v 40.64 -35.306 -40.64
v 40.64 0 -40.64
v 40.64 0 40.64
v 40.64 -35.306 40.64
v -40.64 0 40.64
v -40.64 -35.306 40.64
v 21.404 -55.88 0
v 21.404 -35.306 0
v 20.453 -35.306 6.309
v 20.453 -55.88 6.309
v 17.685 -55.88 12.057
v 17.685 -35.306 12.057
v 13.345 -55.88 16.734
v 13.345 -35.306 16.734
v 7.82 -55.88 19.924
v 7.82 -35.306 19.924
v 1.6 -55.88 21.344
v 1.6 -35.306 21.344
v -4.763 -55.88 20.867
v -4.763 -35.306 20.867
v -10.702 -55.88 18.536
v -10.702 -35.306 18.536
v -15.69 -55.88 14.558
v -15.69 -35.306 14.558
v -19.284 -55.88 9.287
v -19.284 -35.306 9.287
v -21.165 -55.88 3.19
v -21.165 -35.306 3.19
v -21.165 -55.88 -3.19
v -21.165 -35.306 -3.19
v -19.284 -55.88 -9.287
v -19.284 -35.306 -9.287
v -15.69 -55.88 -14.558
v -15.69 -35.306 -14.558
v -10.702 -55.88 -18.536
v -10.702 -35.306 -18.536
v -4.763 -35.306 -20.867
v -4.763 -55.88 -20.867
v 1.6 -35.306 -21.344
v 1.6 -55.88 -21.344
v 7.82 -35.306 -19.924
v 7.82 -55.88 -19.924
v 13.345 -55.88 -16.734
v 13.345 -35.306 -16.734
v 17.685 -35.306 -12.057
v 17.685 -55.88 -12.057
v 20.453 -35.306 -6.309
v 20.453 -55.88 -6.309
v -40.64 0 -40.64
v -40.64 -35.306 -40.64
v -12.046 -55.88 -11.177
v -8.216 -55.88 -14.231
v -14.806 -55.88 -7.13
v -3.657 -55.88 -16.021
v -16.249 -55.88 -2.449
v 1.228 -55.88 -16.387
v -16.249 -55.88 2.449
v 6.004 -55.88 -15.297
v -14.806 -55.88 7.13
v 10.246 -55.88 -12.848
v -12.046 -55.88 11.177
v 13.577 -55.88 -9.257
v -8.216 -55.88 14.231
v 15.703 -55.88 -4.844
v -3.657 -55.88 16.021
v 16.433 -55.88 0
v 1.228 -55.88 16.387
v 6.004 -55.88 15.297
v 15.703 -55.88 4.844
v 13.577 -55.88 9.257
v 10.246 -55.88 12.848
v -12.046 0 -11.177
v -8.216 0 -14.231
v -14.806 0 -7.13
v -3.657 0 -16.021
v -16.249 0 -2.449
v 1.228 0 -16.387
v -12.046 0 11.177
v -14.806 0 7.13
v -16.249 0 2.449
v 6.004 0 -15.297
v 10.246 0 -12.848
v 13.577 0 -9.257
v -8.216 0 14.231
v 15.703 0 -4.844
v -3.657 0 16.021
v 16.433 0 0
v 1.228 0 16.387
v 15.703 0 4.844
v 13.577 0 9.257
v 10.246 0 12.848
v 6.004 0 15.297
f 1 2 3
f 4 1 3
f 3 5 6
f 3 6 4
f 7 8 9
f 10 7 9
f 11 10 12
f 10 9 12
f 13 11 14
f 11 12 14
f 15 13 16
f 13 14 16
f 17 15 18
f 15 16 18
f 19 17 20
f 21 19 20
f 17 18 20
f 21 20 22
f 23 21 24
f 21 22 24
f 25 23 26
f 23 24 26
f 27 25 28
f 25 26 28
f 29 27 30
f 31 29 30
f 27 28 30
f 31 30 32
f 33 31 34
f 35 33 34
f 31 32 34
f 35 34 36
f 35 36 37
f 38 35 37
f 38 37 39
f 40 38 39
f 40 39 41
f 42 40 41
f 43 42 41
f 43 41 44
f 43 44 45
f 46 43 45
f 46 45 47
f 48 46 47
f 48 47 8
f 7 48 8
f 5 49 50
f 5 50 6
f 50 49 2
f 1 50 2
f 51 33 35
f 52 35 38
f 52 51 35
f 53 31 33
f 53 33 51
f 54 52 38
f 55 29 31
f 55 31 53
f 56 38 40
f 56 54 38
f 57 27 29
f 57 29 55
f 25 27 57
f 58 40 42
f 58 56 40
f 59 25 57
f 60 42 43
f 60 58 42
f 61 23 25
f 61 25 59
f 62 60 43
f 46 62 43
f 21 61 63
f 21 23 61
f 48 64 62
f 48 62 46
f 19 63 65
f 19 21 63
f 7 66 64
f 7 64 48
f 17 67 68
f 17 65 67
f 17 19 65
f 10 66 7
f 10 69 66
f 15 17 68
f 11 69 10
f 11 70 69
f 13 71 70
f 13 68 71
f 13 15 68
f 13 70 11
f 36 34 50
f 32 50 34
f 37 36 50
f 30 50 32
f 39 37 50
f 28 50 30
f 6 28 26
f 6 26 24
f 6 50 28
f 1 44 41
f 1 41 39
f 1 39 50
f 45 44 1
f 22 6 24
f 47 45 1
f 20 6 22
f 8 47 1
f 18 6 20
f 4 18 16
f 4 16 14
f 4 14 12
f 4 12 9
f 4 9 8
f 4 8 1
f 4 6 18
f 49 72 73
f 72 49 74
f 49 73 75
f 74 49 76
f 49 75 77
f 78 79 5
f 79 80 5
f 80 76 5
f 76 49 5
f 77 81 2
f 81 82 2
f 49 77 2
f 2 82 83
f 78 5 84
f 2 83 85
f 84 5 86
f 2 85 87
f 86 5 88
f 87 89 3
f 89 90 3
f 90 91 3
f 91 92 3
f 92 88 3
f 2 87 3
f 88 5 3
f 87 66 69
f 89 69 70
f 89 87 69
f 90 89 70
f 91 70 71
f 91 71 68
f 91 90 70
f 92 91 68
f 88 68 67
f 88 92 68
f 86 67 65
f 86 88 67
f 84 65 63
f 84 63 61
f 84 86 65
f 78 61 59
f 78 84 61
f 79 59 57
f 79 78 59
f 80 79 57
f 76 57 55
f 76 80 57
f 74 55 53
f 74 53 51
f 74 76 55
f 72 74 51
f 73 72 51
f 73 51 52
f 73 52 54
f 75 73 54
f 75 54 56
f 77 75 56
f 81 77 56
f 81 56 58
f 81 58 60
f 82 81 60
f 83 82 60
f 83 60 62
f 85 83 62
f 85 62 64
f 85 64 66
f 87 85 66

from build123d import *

# Parameters (mm, degrees)
F0_W     = 81.28
F0_H     = 81.28
F1_DEPTH = 35.306
F2_R     = 16.432892
F3_DEPTH = 52.324
F2_R_2   = 21.403736
F4_DEPTH = 55.88


with BuildPart() as f1:
    # F0 (on Front) → F1 (new body)
    with BuildSketch(Plane.XZ):
        Rectangle(F0_W, F0_H)
    extrude(amount=F1_DEPTH)

    # F2 (on Front) → F3 (cut)
    with BuildSketch(Plane.XZ):
        Circle(F2_R)
    extrude(amount=F3_DEPTH, mode=Mode.SUBTRACT)

    # F2 (on Front) → F4 (join)
    with BuildSketch(Plane.XZ):
        Circle(F2_R_2)
        Circle(F2_R, mode=Mode.SUBTRACT)
    extrude(amount=F4_DEPTH)


solid = f1.part
